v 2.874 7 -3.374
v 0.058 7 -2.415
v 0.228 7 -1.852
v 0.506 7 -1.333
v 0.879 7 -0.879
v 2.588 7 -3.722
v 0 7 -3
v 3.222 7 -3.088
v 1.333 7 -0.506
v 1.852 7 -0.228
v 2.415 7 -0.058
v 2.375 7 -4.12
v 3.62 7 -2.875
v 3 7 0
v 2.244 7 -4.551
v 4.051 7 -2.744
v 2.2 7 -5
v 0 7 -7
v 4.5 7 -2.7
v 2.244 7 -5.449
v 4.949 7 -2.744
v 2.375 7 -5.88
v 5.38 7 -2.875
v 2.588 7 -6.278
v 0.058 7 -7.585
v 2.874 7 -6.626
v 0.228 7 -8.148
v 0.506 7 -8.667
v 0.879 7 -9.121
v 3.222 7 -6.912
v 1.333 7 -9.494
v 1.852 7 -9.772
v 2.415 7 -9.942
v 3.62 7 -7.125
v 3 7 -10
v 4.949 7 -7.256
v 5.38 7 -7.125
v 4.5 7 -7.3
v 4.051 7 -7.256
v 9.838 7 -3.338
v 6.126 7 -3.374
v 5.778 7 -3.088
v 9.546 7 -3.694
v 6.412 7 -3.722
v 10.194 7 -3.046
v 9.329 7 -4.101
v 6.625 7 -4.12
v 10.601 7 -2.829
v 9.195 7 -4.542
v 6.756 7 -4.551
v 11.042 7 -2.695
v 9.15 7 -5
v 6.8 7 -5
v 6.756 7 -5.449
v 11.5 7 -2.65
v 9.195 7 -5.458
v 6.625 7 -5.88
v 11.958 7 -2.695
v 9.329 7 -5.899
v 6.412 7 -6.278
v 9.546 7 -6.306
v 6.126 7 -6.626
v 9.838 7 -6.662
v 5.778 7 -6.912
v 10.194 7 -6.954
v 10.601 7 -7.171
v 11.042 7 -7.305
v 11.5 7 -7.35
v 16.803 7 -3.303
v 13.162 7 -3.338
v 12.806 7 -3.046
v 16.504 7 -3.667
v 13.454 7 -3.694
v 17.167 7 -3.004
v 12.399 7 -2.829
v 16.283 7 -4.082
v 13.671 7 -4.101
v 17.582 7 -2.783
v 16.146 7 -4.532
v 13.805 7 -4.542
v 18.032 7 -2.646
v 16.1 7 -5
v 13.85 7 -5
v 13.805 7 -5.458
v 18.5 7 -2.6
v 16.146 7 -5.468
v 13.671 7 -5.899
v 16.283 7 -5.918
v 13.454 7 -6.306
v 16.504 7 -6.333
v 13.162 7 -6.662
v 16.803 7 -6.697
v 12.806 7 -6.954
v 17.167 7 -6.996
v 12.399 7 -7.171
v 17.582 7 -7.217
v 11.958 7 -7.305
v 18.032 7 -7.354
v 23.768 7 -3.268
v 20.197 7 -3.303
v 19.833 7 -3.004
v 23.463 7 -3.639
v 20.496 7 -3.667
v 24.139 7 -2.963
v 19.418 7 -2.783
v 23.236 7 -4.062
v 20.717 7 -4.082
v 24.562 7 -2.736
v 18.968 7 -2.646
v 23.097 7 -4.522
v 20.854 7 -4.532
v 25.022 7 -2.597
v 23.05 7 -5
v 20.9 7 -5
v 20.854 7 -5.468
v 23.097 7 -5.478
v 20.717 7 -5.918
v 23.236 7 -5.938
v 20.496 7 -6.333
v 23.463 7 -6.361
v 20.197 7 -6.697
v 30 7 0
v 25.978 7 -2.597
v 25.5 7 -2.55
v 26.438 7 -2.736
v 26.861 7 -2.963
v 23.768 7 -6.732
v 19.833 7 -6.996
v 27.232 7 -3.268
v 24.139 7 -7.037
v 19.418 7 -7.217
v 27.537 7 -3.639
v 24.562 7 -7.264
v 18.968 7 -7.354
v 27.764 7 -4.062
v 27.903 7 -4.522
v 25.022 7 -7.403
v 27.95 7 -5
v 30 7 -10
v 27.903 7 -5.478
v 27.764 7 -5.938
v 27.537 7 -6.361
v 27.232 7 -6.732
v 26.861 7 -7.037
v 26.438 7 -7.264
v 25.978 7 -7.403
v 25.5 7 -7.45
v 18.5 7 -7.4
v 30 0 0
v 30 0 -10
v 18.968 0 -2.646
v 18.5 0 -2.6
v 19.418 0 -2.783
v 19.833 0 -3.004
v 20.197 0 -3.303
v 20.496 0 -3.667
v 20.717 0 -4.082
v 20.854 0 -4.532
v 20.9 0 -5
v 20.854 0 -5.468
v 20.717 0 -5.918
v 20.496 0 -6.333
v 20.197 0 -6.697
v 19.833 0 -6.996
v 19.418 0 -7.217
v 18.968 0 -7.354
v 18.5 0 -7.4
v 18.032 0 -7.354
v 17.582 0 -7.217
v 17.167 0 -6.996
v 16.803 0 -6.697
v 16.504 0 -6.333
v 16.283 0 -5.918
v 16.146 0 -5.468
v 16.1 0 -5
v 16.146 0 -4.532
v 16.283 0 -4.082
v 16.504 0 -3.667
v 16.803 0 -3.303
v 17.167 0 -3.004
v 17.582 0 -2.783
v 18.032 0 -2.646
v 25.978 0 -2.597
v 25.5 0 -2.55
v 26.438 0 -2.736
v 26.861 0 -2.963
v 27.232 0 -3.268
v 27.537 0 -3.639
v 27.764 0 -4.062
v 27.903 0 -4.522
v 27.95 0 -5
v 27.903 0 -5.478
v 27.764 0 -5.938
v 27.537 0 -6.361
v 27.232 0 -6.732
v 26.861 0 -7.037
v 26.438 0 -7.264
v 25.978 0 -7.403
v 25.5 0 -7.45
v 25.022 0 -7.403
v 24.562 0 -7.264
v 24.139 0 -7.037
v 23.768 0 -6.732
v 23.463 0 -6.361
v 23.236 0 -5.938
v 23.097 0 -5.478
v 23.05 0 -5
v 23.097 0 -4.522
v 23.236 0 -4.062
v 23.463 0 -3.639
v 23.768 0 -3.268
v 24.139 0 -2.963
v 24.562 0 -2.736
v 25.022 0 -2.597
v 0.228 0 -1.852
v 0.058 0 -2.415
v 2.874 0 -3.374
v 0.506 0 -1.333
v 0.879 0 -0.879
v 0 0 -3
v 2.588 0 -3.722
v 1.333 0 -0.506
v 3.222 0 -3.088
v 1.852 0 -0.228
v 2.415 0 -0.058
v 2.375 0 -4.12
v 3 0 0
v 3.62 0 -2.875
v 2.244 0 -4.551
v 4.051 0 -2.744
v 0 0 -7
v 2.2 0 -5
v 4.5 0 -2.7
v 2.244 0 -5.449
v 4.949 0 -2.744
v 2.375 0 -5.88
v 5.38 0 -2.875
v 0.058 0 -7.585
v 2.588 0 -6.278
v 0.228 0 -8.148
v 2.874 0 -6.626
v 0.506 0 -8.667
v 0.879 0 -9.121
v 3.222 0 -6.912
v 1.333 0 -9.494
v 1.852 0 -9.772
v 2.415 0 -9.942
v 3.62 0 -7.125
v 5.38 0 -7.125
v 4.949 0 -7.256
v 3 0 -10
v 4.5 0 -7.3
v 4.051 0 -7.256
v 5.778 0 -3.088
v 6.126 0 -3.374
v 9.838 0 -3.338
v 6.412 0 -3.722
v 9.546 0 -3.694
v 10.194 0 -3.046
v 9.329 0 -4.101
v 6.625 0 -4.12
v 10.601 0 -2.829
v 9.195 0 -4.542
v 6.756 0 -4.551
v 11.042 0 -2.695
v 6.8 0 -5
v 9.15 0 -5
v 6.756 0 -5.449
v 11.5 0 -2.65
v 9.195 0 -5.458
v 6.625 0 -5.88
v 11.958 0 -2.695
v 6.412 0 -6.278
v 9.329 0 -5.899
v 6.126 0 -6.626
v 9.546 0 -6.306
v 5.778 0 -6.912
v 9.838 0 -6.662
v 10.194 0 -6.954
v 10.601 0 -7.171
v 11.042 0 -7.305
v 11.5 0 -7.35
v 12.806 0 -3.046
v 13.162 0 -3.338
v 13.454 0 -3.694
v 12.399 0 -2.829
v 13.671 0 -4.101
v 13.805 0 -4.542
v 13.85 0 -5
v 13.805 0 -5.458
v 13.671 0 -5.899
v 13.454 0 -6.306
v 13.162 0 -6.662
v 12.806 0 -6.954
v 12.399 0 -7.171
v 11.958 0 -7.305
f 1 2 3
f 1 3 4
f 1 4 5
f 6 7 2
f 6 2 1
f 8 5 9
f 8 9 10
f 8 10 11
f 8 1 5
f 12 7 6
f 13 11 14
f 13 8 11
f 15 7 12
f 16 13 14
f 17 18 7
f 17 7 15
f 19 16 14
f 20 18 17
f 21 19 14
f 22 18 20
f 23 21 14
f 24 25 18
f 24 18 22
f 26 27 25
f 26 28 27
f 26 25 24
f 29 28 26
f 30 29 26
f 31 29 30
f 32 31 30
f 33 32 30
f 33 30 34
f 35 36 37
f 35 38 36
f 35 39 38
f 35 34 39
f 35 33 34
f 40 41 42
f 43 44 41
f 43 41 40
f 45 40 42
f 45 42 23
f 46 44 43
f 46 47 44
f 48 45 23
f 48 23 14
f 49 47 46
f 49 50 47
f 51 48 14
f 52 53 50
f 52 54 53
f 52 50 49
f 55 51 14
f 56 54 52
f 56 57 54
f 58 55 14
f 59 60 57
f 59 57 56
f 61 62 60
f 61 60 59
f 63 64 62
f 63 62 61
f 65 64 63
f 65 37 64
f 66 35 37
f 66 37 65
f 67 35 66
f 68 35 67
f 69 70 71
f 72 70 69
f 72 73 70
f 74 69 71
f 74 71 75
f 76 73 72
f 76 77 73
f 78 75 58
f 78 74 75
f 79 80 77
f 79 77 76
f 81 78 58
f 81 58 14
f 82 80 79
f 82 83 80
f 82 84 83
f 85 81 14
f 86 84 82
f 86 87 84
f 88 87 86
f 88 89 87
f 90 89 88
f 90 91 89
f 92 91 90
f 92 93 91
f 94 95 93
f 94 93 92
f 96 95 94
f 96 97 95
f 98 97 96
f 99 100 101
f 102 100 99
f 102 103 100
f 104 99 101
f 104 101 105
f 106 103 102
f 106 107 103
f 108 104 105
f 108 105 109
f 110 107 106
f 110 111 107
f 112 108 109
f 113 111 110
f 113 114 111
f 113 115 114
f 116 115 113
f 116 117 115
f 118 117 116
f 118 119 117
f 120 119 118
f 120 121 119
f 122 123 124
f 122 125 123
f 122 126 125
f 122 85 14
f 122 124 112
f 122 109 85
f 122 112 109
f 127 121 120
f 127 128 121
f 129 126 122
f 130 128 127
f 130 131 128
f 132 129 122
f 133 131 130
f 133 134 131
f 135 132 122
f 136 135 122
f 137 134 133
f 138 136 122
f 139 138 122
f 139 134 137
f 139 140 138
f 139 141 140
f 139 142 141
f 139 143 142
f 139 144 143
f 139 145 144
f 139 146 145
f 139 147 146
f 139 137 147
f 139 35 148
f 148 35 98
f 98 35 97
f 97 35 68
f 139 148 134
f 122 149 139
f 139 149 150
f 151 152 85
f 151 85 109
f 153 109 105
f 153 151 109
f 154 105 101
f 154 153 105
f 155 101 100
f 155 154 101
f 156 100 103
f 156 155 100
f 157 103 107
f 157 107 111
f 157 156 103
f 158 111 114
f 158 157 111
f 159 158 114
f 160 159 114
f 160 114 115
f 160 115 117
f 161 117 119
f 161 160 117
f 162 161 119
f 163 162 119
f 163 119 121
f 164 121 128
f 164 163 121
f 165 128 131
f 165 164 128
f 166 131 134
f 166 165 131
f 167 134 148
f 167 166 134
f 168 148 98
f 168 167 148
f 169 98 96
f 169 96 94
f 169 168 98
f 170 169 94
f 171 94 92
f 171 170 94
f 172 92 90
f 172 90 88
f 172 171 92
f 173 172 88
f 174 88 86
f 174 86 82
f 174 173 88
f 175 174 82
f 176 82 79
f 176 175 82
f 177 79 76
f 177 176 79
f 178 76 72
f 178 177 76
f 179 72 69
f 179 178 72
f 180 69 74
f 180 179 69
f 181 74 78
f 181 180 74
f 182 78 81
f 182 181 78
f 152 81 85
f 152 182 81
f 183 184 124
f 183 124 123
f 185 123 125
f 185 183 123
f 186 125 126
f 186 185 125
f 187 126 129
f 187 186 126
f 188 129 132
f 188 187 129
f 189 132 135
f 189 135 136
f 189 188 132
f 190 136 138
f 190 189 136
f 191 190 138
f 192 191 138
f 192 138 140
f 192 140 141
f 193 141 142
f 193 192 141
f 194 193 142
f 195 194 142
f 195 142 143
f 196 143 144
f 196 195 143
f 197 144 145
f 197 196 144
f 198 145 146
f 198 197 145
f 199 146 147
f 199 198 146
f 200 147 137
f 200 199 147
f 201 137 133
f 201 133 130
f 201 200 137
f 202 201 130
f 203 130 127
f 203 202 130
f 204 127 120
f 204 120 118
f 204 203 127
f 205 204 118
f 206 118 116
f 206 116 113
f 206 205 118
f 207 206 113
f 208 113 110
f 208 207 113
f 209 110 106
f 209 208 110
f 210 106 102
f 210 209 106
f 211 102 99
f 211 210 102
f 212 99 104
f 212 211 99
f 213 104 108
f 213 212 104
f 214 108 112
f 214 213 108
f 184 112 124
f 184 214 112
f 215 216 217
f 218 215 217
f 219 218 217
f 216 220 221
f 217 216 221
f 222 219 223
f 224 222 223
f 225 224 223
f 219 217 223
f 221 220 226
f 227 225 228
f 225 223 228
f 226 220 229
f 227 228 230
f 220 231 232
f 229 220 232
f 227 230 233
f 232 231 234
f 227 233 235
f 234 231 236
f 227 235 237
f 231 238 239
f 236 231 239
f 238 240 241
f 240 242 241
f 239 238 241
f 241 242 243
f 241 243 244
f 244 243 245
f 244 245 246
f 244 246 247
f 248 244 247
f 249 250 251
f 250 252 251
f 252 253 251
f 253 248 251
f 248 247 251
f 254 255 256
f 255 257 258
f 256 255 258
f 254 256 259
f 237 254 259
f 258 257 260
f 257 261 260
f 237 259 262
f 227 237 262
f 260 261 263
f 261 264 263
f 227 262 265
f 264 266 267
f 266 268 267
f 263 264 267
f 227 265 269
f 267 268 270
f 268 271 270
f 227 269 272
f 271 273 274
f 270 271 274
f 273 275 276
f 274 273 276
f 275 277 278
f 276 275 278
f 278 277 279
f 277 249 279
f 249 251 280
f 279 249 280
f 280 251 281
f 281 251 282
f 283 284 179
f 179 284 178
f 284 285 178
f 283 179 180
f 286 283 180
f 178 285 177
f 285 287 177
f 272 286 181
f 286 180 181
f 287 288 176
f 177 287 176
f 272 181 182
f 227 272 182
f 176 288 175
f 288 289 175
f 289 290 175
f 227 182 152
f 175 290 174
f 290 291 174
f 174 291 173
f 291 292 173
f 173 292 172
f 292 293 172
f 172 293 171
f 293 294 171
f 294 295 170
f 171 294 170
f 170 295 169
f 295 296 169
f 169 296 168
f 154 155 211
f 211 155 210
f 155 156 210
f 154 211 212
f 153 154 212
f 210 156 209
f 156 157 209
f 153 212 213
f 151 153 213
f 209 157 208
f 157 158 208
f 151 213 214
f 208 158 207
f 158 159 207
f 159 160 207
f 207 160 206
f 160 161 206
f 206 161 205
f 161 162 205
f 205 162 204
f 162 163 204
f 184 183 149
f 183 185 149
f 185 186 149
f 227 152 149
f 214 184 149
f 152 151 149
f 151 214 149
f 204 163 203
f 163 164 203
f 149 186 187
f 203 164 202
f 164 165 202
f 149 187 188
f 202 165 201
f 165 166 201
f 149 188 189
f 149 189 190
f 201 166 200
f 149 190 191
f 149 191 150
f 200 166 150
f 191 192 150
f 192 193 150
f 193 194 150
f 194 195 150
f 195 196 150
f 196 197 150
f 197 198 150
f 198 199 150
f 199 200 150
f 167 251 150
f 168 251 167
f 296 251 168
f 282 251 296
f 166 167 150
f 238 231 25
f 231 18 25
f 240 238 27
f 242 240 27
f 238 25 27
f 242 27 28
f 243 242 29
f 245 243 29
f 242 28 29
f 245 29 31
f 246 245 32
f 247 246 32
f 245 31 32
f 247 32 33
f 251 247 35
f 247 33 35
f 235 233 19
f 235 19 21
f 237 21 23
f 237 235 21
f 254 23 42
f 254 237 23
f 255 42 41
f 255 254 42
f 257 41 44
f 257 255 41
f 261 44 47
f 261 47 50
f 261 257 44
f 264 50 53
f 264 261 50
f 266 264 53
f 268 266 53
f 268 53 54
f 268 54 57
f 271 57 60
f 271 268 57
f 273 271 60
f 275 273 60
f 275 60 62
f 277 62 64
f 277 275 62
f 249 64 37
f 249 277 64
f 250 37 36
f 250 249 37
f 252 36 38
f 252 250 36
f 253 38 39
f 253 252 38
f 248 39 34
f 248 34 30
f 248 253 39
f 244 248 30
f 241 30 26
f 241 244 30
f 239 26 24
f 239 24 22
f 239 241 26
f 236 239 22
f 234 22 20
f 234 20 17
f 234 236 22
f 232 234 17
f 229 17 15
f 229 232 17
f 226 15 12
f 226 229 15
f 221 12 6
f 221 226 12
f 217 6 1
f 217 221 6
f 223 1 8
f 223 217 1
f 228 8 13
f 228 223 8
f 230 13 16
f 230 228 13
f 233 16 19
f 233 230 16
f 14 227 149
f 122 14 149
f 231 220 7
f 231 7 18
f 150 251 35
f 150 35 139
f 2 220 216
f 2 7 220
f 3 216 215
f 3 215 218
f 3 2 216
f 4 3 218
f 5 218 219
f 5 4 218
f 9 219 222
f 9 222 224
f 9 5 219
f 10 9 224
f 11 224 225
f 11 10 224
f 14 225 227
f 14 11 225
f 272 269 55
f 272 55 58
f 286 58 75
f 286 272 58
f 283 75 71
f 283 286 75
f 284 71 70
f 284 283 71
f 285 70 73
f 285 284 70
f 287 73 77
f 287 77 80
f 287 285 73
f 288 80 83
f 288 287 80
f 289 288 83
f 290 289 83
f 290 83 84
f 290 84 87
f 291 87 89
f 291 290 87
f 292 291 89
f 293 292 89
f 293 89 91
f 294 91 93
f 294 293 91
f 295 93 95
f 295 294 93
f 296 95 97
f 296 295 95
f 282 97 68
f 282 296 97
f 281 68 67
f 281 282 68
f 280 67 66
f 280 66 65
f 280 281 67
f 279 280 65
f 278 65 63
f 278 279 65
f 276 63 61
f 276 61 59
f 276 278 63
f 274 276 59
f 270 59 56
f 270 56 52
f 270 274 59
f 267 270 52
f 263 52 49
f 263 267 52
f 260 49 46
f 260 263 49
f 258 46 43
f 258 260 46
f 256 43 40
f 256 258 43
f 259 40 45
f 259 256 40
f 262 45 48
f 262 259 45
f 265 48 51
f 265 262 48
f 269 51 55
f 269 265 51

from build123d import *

# Parameters (mm, degrees)
SKETCH1_W           = 30
SKETCH1_H           = 10
SKETCH1_R           = 2.3
SKETCH1_R_2         = 2.35
SKETCH1_R_3         = 2.4
SKETCH1_R_4         = 2.45
BOSS_EXTRUDE1_DEPTH = 7
FILLET1_R           = 3


with BuildPart() as part:
    # Sketch1 → Boss-Extrude1 (new body)
    with BuildSketch(Plane(origin=(0, 0, 0), x_dir=(1, 0, 0), z_dir=(0, 1, 0))):
        with Locations((15, 5)):
            Rectangle(SKETCH1_W, SKETCH1_H)
        with Locations(Location((4.5, 5, 0), (0, 0, 270))):
            Circle(SKETCH1_R, mode=Mode.SUBTRACT)
        with Locations(Location((11.5, 5, 0), (0, 0, 270))):
            Circle(SKETCH1_R_2, mode=Mode.SUBTRACT)
        with Locations(Location((18.5, 5, 0), (0, 0, 270))):
            Circle(SKETCH1_R_3, mode=Mode.SUBTRACT)
        with Locations(Location((25.5, 5, 0), (0, 0, 270))):
            Circle(SKETCH1_R_4, mode=Mode.SUBTRACT)
    extrude(amount=BOSS_EXTRUDE1_DEPTH)

    # Fillet1
    fillet1_edges = [part.edges().sort_by_distance(p)[0] for p in [
        (0, 3.5, -10),
        (0, 3.5, 0),
    ]]
    fillet(fillet1_edges, radius=FILLET1_R)


solid = part.part
